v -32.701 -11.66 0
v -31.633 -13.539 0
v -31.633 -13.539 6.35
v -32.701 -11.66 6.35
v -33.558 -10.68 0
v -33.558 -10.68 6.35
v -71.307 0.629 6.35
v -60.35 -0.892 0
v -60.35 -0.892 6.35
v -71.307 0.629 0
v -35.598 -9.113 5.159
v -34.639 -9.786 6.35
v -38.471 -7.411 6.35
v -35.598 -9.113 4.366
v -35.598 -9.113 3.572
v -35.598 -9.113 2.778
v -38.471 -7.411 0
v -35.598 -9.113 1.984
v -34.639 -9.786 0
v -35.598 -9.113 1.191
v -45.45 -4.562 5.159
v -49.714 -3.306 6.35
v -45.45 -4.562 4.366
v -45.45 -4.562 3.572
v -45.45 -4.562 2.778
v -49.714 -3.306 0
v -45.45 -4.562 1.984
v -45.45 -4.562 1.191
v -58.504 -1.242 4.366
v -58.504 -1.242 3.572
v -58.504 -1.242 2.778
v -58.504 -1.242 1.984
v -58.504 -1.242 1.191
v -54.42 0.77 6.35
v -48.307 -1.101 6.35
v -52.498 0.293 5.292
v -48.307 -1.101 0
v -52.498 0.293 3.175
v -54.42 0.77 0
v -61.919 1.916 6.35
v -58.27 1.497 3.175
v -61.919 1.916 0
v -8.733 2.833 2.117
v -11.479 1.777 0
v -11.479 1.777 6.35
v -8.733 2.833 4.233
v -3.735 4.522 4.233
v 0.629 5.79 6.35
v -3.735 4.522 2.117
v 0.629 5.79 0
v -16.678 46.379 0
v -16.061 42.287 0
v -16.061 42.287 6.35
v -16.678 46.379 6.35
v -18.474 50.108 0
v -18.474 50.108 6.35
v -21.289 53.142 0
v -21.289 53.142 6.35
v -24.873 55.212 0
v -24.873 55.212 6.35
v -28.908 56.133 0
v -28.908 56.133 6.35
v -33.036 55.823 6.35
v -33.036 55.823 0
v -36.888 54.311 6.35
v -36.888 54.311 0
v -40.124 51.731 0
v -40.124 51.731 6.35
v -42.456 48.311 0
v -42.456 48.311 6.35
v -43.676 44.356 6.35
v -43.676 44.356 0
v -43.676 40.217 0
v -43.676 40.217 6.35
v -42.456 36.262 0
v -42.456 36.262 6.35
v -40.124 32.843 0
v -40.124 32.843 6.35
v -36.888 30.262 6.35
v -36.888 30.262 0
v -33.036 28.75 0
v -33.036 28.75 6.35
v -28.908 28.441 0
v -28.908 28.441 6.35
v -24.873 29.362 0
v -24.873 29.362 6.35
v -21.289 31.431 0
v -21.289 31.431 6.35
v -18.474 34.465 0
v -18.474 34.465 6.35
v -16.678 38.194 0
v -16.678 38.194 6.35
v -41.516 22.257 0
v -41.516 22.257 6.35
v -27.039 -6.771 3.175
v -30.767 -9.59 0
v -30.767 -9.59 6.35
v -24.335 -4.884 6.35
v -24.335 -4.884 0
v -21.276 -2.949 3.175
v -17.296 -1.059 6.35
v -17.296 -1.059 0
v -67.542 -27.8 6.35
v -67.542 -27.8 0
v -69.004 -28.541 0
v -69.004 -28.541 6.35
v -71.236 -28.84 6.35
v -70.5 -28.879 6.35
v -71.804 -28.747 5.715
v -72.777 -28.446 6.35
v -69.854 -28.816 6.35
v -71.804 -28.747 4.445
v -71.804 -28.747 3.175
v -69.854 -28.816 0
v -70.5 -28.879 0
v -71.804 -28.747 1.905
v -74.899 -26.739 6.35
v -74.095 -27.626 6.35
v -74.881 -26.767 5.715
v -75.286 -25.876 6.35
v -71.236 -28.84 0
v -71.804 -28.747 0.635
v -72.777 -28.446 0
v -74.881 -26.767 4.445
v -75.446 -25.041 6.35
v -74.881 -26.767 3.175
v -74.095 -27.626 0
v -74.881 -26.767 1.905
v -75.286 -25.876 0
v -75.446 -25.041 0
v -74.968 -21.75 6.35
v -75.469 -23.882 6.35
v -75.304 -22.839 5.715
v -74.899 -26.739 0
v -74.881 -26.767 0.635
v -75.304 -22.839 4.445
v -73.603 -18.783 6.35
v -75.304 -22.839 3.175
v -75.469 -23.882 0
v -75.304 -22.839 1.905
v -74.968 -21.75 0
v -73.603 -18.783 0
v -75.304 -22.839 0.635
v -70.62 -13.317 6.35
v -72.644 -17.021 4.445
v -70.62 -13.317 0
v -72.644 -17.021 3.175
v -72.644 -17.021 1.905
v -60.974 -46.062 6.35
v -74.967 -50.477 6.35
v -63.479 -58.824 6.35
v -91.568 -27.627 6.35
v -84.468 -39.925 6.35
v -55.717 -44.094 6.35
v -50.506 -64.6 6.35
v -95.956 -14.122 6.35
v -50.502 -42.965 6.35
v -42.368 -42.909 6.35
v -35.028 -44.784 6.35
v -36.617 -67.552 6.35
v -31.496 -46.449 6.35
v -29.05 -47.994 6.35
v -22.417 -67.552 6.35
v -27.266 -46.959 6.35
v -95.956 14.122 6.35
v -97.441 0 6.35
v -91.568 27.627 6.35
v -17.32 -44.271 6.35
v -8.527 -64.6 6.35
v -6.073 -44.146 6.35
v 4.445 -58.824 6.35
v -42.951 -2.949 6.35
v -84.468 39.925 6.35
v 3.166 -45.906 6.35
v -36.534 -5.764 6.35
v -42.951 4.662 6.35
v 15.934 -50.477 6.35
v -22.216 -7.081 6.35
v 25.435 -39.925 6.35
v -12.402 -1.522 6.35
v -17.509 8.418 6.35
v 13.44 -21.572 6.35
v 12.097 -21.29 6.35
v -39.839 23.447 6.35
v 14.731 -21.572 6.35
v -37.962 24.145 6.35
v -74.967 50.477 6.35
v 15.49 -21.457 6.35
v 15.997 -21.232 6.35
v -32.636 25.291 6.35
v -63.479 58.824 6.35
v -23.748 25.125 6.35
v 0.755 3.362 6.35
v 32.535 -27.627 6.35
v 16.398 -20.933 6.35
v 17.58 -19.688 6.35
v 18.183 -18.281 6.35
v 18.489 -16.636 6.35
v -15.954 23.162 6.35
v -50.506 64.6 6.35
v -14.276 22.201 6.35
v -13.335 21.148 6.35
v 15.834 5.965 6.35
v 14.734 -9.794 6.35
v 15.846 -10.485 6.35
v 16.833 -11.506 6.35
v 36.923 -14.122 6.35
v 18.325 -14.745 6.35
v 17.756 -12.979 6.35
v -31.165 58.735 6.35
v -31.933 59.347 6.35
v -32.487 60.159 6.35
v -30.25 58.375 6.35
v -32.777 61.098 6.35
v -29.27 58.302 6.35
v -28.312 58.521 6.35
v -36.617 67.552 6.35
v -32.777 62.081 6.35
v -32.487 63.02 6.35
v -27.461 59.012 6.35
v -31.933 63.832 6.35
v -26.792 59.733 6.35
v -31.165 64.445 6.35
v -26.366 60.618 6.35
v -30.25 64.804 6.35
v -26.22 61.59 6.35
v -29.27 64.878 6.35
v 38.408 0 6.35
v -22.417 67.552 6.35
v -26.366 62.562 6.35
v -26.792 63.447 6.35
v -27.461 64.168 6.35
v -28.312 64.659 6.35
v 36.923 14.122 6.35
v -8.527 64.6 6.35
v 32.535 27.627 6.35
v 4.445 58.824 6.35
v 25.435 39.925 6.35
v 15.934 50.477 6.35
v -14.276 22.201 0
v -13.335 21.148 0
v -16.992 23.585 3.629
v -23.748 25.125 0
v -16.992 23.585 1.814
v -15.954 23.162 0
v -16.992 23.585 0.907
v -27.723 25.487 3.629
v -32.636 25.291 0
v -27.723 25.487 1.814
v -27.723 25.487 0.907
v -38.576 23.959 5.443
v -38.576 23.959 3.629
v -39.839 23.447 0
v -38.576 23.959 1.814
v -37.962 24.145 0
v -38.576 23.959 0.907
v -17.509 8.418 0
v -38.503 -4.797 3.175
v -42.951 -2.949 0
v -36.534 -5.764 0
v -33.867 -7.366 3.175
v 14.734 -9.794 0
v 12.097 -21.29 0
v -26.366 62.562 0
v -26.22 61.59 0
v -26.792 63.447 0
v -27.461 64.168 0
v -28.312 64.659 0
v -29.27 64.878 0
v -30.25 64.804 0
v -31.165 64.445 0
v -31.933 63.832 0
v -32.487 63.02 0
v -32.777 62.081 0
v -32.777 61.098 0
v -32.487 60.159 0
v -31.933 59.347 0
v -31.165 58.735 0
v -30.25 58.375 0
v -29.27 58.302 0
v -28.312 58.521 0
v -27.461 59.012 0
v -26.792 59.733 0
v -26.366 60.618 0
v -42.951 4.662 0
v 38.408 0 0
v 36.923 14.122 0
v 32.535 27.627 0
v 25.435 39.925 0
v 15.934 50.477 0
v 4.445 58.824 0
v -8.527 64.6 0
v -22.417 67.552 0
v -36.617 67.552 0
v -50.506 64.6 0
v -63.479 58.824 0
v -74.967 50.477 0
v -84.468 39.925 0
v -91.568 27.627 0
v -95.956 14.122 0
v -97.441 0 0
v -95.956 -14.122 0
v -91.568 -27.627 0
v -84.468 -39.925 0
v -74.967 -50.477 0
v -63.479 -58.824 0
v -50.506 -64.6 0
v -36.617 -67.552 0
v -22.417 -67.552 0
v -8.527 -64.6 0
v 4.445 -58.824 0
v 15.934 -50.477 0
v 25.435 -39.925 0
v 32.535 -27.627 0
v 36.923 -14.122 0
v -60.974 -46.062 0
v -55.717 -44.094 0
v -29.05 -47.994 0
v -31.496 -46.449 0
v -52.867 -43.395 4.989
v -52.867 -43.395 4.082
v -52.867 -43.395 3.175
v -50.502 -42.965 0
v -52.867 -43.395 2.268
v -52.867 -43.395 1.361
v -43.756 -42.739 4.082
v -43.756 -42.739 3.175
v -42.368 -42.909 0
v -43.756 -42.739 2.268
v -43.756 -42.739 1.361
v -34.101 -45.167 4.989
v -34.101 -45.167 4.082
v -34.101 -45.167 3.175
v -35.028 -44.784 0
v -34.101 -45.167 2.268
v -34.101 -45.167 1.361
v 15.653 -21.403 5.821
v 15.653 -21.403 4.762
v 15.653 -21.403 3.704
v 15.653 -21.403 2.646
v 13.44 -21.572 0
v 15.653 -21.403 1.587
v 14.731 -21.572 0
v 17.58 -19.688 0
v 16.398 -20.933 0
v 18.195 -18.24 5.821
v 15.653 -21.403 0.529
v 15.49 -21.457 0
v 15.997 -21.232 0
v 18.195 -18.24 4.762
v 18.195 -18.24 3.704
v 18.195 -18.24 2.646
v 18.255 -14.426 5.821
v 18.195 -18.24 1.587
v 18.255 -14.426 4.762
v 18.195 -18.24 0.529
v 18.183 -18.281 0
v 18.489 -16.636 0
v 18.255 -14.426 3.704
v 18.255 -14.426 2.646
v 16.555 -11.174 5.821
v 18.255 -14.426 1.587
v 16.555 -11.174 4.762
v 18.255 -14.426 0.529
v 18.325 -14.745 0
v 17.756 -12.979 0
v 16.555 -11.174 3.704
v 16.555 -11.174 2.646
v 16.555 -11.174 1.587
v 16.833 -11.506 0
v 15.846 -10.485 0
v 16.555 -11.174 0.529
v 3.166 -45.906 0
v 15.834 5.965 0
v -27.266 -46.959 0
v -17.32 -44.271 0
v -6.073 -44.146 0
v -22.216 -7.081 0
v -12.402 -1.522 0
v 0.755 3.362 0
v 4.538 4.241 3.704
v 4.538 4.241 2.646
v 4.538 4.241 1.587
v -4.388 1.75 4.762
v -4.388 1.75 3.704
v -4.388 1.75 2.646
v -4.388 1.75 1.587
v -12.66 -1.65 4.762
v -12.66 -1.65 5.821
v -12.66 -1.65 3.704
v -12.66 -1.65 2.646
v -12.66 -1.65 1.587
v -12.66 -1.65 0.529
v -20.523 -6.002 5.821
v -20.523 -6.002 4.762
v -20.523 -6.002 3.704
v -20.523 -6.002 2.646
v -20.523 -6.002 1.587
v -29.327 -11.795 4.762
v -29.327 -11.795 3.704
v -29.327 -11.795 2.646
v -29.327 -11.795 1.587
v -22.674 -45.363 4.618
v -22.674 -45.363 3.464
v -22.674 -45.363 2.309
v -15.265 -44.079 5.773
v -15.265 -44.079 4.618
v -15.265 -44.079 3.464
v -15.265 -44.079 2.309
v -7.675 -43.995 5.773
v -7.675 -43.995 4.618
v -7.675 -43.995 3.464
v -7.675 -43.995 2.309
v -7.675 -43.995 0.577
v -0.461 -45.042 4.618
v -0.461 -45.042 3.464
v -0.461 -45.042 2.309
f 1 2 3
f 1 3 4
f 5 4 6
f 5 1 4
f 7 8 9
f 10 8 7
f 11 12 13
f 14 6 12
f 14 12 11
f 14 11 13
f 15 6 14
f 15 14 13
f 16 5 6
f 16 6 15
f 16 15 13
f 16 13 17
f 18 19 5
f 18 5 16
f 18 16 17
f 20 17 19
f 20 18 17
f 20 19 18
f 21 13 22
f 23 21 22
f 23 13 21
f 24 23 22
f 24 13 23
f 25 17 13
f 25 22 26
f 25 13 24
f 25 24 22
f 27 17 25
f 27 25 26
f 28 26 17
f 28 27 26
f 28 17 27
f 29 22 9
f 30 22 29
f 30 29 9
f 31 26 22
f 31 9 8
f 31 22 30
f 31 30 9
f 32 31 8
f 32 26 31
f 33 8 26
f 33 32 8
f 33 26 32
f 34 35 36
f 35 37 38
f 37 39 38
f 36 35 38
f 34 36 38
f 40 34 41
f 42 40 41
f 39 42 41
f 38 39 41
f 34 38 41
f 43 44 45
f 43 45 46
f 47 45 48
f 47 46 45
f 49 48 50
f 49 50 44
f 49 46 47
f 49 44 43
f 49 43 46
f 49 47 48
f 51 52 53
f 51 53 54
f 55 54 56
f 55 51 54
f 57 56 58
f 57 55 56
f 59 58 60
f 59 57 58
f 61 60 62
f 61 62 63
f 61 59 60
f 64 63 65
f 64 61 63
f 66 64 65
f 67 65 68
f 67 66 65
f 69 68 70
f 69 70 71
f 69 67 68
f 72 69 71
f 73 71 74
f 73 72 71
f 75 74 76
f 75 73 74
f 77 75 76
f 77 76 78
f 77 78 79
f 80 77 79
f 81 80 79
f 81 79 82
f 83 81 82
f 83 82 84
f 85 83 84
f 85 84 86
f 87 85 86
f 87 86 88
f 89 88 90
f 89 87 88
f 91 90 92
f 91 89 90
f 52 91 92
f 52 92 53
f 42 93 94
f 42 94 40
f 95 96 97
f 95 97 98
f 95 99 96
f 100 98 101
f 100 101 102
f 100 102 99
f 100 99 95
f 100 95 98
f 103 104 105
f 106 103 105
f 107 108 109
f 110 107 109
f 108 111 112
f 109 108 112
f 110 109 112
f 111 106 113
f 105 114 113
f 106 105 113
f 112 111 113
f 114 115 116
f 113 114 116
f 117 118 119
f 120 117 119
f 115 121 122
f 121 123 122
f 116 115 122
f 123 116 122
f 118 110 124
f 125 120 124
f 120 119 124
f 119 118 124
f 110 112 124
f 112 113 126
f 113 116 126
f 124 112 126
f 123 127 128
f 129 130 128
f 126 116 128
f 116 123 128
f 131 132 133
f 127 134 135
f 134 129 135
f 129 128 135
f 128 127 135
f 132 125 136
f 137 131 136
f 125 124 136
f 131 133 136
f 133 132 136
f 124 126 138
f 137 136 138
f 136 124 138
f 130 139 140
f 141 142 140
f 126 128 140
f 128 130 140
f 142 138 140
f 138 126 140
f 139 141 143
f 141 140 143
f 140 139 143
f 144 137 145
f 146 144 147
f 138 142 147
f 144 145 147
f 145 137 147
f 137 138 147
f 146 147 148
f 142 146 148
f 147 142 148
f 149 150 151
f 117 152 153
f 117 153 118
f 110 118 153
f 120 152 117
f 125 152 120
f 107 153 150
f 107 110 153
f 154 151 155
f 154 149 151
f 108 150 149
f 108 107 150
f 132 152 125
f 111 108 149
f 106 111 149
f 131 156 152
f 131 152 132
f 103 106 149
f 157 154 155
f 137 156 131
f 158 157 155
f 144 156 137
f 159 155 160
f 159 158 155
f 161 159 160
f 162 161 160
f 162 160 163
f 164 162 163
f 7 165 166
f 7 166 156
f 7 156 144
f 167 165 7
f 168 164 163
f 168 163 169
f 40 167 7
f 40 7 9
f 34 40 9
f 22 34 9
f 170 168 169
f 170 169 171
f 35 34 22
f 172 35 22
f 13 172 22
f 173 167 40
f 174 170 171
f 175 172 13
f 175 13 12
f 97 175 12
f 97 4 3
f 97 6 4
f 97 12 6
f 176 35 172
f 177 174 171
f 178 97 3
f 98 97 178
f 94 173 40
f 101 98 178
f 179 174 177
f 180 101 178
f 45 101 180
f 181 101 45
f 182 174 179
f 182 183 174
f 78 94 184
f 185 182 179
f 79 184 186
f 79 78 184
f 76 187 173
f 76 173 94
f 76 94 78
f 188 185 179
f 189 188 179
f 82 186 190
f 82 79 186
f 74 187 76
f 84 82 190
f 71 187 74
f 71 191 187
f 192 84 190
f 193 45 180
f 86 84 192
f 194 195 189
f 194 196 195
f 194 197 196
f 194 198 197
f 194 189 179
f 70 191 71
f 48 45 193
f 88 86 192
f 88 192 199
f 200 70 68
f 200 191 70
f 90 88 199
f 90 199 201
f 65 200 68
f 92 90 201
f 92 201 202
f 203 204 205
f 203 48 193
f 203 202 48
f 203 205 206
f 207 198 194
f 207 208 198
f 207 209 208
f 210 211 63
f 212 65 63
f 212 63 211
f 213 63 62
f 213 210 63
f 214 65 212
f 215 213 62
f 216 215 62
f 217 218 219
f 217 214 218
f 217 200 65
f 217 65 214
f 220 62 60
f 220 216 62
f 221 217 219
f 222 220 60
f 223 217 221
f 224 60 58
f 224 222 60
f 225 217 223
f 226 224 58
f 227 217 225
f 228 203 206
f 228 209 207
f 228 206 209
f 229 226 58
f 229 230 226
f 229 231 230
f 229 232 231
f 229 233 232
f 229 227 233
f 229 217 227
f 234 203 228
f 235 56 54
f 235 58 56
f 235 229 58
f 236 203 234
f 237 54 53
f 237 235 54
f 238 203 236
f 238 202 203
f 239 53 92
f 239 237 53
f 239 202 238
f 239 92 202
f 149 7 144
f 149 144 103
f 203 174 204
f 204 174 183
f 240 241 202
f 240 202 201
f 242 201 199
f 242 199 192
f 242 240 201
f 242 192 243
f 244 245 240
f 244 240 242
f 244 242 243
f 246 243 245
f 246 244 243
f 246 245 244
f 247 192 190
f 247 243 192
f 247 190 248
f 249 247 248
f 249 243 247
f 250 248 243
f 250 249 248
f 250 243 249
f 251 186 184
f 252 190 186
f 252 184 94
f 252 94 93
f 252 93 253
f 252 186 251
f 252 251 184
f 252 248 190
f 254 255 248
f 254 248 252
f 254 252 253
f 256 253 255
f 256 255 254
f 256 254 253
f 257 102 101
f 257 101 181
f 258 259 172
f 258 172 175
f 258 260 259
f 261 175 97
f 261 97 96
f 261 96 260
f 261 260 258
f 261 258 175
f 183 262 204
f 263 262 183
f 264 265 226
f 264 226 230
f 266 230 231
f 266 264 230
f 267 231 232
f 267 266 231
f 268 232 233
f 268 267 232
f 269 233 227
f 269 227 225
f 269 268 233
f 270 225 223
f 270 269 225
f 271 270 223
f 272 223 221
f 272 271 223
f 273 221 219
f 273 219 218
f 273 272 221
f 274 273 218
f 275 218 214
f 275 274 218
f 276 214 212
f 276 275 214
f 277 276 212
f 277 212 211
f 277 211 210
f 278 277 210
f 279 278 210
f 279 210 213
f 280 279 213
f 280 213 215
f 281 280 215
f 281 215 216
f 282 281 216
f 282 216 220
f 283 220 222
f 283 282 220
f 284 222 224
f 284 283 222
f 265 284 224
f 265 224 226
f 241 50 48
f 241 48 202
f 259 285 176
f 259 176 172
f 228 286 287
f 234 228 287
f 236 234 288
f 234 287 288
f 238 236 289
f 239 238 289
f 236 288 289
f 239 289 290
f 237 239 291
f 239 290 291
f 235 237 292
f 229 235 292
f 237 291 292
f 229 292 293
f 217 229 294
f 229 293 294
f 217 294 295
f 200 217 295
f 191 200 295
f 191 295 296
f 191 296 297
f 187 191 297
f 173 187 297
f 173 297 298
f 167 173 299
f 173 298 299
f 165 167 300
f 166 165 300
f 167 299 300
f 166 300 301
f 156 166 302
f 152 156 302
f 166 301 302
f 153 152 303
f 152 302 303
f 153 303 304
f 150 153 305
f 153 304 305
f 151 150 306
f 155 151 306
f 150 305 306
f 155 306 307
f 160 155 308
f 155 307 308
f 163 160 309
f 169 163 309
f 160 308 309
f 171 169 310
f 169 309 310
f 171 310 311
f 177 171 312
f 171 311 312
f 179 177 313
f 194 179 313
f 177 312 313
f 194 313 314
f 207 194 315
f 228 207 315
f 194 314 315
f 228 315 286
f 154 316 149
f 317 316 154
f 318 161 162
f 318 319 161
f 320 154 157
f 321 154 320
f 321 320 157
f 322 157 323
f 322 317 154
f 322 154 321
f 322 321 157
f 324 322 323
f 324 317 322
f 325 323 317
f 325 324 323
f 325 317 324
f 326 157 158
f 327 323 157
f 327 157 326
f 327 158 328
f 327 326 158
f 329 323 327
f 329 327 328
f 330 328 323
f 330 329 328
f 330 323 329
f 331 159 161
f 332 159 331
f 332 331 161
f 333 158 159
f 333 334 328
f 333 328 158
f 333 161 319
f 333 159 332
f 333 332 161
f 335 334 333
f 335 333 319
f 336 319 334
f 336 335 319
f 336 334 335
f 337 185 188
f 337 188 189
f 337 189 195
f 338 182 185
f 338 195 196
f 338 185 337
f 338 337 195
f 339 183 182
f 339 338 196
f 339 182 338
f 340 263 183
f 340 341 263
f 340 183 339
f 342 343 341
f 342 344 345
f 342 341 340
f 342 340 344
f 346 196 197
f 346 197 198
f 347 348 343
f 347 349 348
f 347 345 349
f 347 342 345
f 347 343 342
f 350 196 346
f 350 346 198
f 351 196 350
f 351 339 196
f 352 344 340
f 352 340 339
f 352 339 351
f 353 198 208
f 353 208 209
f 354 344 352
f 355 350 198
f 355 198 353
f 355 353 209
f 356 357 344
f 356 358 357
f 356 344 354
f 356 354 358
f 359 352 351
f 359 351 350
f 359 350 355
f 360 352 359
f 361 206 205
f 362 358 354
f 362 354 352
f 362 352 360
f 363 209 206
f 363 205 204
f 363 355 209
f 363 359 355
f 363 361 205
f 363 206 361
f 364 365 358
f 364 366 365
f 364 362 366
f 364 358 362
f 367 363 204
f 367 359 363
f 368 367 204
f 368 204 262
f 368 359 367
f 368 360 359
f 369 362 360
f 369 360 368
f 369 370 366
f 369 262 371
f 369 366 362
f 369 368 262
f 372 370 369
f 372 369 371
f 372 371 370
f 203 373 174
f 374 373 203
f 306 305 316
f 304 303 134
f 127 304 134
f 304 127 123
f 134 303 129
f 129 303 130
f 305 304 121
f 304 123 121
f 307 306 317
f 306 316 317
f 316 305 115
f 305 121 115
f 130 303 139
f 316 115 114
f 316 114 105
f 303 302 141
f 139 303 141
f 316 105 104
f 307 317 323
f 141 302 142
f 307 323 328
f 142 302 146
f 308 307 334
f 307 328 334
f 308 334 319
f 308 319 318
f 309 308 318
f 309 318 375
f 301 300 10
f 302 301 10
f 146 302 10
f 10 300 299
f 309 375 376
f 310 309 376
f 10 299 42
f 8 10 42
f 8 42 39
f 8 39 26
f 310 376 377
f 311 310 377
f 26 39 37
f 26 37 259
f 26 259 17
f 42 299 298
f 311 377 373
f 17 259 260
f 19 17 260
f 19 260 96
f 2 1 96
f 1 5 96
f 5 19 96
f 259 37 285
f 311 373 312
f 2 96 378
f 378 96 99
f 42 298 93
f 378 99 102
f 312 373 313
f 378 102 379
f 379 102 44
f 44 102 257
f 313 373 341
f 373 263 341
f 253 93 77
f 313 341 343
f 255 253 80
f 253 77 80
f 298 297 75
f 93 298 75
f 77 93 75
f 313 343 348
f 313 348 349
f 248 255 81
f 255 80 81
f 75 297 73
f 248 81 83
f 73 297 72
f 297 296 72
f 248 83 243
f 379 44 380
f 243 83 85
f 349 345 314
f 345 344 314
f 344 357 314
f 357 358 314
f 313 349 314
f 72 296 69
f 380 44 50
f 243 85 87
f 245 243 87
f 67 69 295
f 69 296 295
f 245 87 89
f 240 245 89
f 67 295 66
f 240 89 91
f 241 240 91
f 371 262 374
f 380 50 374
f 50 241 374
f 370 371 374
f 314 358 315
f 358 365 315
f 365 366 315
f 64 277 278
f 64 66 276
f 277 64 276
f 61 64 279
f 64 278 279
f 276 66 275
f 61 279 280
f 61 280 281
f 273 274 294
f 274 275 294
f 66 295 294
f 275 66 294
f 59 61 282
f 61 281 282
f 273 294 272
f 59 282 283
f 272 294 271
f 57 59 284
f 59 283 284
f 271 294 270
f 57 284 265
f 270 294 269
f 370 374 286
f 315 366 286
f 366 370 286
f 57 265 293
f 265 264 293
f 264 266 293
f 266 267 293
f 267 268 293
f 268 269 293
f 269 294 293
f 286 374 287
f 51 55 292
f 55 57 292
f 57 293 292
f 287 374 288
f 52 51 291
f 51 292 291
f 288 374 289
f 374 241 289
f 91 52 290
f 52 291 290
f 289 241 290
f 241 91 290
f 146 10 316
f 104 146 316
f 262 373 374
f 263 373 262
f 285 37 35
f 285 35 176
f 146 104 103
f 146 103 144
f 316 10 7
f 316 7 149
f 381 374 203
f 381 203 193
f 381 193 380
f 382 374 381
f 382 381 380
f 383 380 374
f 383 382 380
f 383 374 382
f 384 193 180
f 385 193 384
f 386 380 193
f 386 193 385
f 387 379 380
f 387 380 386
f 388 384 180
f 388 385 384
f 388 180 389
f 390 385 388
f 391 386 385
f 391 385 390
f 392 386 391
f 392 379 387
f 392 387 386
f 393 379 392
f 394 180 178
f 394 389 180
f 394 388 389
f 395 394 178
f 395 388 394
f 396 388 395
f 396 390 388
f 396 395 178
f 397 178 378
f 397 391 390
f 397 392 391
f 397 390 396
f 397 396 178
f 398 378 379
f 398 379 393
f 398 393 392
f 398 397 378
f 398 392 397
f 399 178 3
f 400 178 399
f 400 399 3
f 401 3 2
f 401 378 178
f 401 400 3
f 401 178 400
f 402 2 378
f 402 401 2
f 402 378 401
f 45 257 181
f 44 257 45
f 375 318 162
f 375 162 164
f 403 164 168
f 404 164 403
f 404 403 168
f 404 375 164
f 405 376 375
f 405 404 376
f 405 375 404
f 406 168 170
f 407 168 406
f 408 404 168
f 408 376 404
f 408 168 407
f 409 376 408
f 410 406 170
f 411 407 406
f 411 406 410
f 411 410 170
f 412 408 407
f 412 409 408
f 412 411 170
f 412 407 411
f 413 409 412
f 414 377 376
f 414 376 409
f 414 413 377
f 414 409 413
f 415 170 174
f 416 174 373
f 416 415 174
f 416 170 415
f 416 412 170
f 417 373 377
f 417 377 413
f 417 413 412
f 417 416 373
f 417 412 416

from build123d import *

# Parameters (mm, degrees)
F1_R     = 67.9240818275
F1_R_2   = 3.2970637352
F2_DEPTH = 6.35
F0_R     = 13.8845983505
F3_DEPTH = 6.35


with BuildPart() as f2:
    # F1 (on Top) → F2 (new body)
    with BuildSketch(Plane.XY):
        with Locations((-29.5165721327, 0)):
            Circle(F1_R)
        with Locations((-29.5165721327, 61.5898780525)):
            Circle(F1_R_2, mode=Mode.SUBTRACT)
    extrude(amount=F2_DEPTH)

    # F0 (on Top) → F3 (cut)
    with BuildSketch(Plane.XY):
        with BuildLine():
            add(Edge.make_bspline(
                [(-29.0498677641, -47.994083102), (-28.7562750483, -47.7744943748), (-28.0326832273, -47.233293594), (-25.5901475599, -46.2825085236), (-22.628303243, -45.3308594809), (-19.6171726554, -44.4731391282), (-15.1873701434, -44.0529235188), (-12.2234331544, -43.8706255299), (-7.5865516521, -43.9108818725), (-4.2181497721, -44.3930452447), (-0.4931025602, -45.0155043138), (1.39234573, -45.4177008249), (2.5827954274, -45.7454541012), (3.1660166569, -45.9060259163)],
                knots=[0, 0, 0, 0, 0.0584373646, 0.1440253685, 0.2384074636, 0.3337833128, 0.4445463725, 0.5385430693, 0.6512464007, 0.7524465741, 0.8545872542, 0.9287598623, 1, 1, 1, 1], degree=3))
            Line((3.1660166569, -45.9060259163), (15.8340260386, 5.9648929164))
            add(Edge.make_bspline(
                [(15.8340260386, 5.9648929164), (15.2384968235, 5.9327749915), (13.7677368409, 5.8534543514), (9.4623754806, 5.2804309627), (4.5839345102, 4.2674281698), (-0.4838561282, 3.1191257922), (-4.3472023994, 1.7498205974), (-8.865106749, 0.2382220688), (-12.6642021735, -1.6538779414), (-16.3704653674, -3.4899302211), (-20.6267373868, -6.0252186493), (-24.3588765036, -8.4874460643), (-29.3154189292, -11.7076169373), (-30.9557944538, -13.003740058), (-31.6331088543, -13.5389119387)],
                knots=[0, 0, 0, 0, 0.0566828993, 0.1399879937, 0.2318621526, 0.3232520906, 0.4052447923, 0.4927595075, 0.5757864811, 0.6578743994, 0.7466184655, 0.8339648127, 0.9314437325, 1, 1, 1, 1], degree=3))
            add(Edge.make_bspline(
                [(-31.6331088543, -13.5389119387), (-31.7559753606, -13.2574223409), (-32.0196692251, -12.6532944785), (-32.7174360962, -11.5840806695), (-33.7581196216, -10.3896553325), (-35.6249676026, -9.0808042113), (-37.513212275, -7.8419555334), (-39.9590098241, -6.7025302991), (-42.6435731092, -5.5716989936), (-45.4654422731, -4.5279038012), (-48.0858137167, -3.7323539864), (-51.6836075871, -2.7818105416), (-55.2873543074, -1.9026873303), (-58.4913611853, -1.2315675394), (-61.6612863142, -0.6469579575), (-65.0422872661, -0.1026984819), (-68.5683342745, 0.3734442186), (-70.4355544851, 0.5479134916), (-71.3065415621, 0.6292967591)],
                knots=[0, 0, 0, 0, 0.0375386, 0.0805646616, 0.1290759605, 0.1869720465, 0.245212555, 0.3081916776, 0.3744215958, 0.4408225673, 0.5046476095, 0.5788703832, 0.6536008643, 0.7231355156, 0.7919800641, 0.8637021576, 0.9364222502, 1, 1, 1, 1], degree=3))
            Line((-71.3065415621, 0.6292967591), (-60.9741993248, -46.0623055696))
            add(Edge.make_bspline(
                [(-60.9741993248, -46.0623055696), (-60.6151729445, -45.8891432414), (-59.8204888356, -45.5058584521), (-58.0754151915, -44.8839267704), (-55.6804866208, -44.0295365508), (-52.899440529, -43.3777685087), (-49.7898543048, -42.7990861879), (-47.4044953043, -42.7689488167), (-43.7021474647, -42.6166882508), (-41.3471534926, -43.1206743429), (-38.4853074258, -43.5358546676), (-36.2461458511, -44.3262400311), (-34.0754122427, -45.1229750276), (-31.556117416, -46.3970906091), (-29.700845648, -47.4279703562), (-29.2298332206, -47.8375789545), (-29.0498677641, -47.994083102)],
                knots=[0, 0, 0, 0, 0.0522039384, 0.1155503956, 0.1902201948, 0.2703336821, 0.3525330784, 0.4261238857, 0.5149147516, 0.5888516207, 0.6674970059, 0.7395371623, 0.8106029787, 0.8904046518, 0.9581255701, 1, 1, 1, 1], degree=3))
        make_face()
        with Locations((-29.9460499995, 42.2867882448)):
            Circle(F0_R)
        with BuildLine():
            Line((14.7338649258, -9.7936093807), (12.0970150456, -21.2902743369))
            add(Edge.make_bspline(
                [(12.0970150456, -21.2902743369), (12.4305441601, -21.3898383375), (13.0810254211, -21.5840178374), (13.965446666, -21.5724464281), (15.7554651618, -21.6184021643), (16.8296099665, -20.5065314961), (17.7038120002, -19.6877452516), (18.2410719919, -18.2095070718), (18.5997800341, -16.5827316107), (18.3353808507, -14.3945977554), (17.6418535632, -12.5556286434), (16.5989633088, -11.1646383857), (15.7241257156, -10.3291787179), (15.05975327, -9.969861744), (14.7338649258, -9.7936093807)],
                knots=[0, 0, 0, 0, 0.069369053, 0.1352903453, 0.2256027492, 0.3099553662, 0.3854291327, 0.4705246795, 0.5604983881, 0.6627266994, 0.7606750176, 0.8513036552, 0.9270613857, 1, 1, 1, 1], degree=3))
        make_face()
        with BuildLine():
            Line((-67.541770637, -27.8001111001), (-70.6199258566, -13.3169991896))
            add(Edge.make_bspline(
                [(-67.541770637, -27.8001111001), (-67.8592974548, -27.9678826055), (-68.5423262068, -28.3287742077), (-69.8928592225, -28.9809476863), (-71.8531585295, -28.8184438377), (-73.3697382485, -28.2596362107), (-75.0780945469, -26.8723304257), (-75.5511129776, -24.9505261106), (-75.4487384922, -22.7675251051), (-74.1749168858, -19.7816825627), (-72.6283809325, -17.0063518412), (-71.3183732321, -14.5999846583), (-70.6199258566, -13.3169991896)],
                knots=[0, 0, 0, 0, 0.0710682999, 0.1528743069, 0.2456703251, 0.3320985068, 0.4292256394, 0.5216087698, 0.6202715482, 0.7402961601, 0.8615355731, 1, 1, 1, 1], degree=3))
        make_face()
        with BuildLine():
            add(Edge.make_bspline(
                [(-48.307005316, -1.1013938347), (-48.806436791, -0.9152700344), (-50.0401714409, -0.4213164381), (-52.5482199289, 0.3300226769), (-54.9790562259, 0.9210327378), (-58.2142337763, 1.4954046457), (-60.5072072538, 1.8634804189), (-61.4352327642, 1.8976641634), (-61.9190074503, 1.9162708195)],
                knots=[0, 0, 0, 0, 0.1485561988, 0.3261472509, 0.5029687094, 0.7036791256, 0.8705749514, 1, 1, 1, 1], degree=3))
            Line((-48.307005316, -1.1013938347), (-42.9509058595, 4.6618939377))
            Line((-42.9509058595, 4.6618939377), (-42.9509058595, -2.9494049959))
            add(Edge.make_bspline(
                [(-42.9509058595, -2.9494049959), (-42.369001034, -3.1536515402), (-41.0880423516, -3.6032635263), (-38.4456896654, -4.8222161034), (-36.5025220165, -5.7280933104), (-33.8352399083, -7.3365775098), (-32.368731582, -8.4461148571), (-31.3026559449, -9.2070628451), (-30.7665653527, -9.5897158608)],
                knots=[0, 0, 0, 0, 0.1542842522, 0.3396289972, 0.505122399, 0.6965110369, 0.847386459, 1, 1, 1, 1], degree=3))
            add(Edge.make_bspline(
                [(-30.7665653527, -9.5897158608), (-30.4377735021, -9.2717806162), (-29.6410525398, -8.5015392638), (-26.9373515405, -6.7328604933), (-24.3785711846, -4.87965384), (-21.3838575318, -2.9298077051), (-18.7235908162, -1.6299498574), (-17.7567602172, -1.237326992), (-17.2959100455, -1.0587312281)],
                knots=[0, 0, 0, 0, 0.127189264, 0.3116020539, 0.4992686543, 0.6966212053, 0.8733754999, 1, 1, 1, 1], degree=3))
            Line((-17.2959100455, -1.0587312281), (-17.5091419369, 8.4176026285))
            Line((-17.5091419369, 8.4176026285), (-11.4785972983, 1.7769651022))
            add(Edge.make_bspline(
                [(-11.4785972983, 1.7769651022), (-10.643786198, 2.1082891187), (-8.690945412, 2.8833423644), (-3.6809913971, 4.5894429261), (-0.7712276092, 5.3995512093), (0.6294193445, 5.7895057835)],
                knots=[0, 0, 0, 0, 0.279153373, 0.6530125104, 1, 1, 1, 1], degree=3))
            Line((0.6294193445, 5.7895057835), (-13.3345490322, 21.1475472897))
            add(Edge.make_bspline(
                [(-13.3345490322, 21.1475472897), (-13.6046610438, 21.5160603278), (-14.2439055986, 22.3998900999), (-17.1542964167, 23.7580529541), (-21.3265620468, 24.9030413288), (-27.8520509757, 25.6130437225), (-32.4351599793, 25.5117042473), (-38.9232060036, 24.0122505989), (-40.2592197061, 23.2942011207), (-41.5158644319, 22.2571324557)],
                knots=[0, 0, 0, 0, 0.0852197997, 0.2081060021, 0.3584138568, 0.5378075164, 0.695214424, 0.8695151155, 1, 1, 1, 1], degree=3))
            Line((-41.5158644319, 22.2571324557), (-61.9190074503, 1.9162708195))
        make_face()
    extrude(amount=F3_DEPTH, mode=Mode.SUBTRACT)


solid = f2.part
